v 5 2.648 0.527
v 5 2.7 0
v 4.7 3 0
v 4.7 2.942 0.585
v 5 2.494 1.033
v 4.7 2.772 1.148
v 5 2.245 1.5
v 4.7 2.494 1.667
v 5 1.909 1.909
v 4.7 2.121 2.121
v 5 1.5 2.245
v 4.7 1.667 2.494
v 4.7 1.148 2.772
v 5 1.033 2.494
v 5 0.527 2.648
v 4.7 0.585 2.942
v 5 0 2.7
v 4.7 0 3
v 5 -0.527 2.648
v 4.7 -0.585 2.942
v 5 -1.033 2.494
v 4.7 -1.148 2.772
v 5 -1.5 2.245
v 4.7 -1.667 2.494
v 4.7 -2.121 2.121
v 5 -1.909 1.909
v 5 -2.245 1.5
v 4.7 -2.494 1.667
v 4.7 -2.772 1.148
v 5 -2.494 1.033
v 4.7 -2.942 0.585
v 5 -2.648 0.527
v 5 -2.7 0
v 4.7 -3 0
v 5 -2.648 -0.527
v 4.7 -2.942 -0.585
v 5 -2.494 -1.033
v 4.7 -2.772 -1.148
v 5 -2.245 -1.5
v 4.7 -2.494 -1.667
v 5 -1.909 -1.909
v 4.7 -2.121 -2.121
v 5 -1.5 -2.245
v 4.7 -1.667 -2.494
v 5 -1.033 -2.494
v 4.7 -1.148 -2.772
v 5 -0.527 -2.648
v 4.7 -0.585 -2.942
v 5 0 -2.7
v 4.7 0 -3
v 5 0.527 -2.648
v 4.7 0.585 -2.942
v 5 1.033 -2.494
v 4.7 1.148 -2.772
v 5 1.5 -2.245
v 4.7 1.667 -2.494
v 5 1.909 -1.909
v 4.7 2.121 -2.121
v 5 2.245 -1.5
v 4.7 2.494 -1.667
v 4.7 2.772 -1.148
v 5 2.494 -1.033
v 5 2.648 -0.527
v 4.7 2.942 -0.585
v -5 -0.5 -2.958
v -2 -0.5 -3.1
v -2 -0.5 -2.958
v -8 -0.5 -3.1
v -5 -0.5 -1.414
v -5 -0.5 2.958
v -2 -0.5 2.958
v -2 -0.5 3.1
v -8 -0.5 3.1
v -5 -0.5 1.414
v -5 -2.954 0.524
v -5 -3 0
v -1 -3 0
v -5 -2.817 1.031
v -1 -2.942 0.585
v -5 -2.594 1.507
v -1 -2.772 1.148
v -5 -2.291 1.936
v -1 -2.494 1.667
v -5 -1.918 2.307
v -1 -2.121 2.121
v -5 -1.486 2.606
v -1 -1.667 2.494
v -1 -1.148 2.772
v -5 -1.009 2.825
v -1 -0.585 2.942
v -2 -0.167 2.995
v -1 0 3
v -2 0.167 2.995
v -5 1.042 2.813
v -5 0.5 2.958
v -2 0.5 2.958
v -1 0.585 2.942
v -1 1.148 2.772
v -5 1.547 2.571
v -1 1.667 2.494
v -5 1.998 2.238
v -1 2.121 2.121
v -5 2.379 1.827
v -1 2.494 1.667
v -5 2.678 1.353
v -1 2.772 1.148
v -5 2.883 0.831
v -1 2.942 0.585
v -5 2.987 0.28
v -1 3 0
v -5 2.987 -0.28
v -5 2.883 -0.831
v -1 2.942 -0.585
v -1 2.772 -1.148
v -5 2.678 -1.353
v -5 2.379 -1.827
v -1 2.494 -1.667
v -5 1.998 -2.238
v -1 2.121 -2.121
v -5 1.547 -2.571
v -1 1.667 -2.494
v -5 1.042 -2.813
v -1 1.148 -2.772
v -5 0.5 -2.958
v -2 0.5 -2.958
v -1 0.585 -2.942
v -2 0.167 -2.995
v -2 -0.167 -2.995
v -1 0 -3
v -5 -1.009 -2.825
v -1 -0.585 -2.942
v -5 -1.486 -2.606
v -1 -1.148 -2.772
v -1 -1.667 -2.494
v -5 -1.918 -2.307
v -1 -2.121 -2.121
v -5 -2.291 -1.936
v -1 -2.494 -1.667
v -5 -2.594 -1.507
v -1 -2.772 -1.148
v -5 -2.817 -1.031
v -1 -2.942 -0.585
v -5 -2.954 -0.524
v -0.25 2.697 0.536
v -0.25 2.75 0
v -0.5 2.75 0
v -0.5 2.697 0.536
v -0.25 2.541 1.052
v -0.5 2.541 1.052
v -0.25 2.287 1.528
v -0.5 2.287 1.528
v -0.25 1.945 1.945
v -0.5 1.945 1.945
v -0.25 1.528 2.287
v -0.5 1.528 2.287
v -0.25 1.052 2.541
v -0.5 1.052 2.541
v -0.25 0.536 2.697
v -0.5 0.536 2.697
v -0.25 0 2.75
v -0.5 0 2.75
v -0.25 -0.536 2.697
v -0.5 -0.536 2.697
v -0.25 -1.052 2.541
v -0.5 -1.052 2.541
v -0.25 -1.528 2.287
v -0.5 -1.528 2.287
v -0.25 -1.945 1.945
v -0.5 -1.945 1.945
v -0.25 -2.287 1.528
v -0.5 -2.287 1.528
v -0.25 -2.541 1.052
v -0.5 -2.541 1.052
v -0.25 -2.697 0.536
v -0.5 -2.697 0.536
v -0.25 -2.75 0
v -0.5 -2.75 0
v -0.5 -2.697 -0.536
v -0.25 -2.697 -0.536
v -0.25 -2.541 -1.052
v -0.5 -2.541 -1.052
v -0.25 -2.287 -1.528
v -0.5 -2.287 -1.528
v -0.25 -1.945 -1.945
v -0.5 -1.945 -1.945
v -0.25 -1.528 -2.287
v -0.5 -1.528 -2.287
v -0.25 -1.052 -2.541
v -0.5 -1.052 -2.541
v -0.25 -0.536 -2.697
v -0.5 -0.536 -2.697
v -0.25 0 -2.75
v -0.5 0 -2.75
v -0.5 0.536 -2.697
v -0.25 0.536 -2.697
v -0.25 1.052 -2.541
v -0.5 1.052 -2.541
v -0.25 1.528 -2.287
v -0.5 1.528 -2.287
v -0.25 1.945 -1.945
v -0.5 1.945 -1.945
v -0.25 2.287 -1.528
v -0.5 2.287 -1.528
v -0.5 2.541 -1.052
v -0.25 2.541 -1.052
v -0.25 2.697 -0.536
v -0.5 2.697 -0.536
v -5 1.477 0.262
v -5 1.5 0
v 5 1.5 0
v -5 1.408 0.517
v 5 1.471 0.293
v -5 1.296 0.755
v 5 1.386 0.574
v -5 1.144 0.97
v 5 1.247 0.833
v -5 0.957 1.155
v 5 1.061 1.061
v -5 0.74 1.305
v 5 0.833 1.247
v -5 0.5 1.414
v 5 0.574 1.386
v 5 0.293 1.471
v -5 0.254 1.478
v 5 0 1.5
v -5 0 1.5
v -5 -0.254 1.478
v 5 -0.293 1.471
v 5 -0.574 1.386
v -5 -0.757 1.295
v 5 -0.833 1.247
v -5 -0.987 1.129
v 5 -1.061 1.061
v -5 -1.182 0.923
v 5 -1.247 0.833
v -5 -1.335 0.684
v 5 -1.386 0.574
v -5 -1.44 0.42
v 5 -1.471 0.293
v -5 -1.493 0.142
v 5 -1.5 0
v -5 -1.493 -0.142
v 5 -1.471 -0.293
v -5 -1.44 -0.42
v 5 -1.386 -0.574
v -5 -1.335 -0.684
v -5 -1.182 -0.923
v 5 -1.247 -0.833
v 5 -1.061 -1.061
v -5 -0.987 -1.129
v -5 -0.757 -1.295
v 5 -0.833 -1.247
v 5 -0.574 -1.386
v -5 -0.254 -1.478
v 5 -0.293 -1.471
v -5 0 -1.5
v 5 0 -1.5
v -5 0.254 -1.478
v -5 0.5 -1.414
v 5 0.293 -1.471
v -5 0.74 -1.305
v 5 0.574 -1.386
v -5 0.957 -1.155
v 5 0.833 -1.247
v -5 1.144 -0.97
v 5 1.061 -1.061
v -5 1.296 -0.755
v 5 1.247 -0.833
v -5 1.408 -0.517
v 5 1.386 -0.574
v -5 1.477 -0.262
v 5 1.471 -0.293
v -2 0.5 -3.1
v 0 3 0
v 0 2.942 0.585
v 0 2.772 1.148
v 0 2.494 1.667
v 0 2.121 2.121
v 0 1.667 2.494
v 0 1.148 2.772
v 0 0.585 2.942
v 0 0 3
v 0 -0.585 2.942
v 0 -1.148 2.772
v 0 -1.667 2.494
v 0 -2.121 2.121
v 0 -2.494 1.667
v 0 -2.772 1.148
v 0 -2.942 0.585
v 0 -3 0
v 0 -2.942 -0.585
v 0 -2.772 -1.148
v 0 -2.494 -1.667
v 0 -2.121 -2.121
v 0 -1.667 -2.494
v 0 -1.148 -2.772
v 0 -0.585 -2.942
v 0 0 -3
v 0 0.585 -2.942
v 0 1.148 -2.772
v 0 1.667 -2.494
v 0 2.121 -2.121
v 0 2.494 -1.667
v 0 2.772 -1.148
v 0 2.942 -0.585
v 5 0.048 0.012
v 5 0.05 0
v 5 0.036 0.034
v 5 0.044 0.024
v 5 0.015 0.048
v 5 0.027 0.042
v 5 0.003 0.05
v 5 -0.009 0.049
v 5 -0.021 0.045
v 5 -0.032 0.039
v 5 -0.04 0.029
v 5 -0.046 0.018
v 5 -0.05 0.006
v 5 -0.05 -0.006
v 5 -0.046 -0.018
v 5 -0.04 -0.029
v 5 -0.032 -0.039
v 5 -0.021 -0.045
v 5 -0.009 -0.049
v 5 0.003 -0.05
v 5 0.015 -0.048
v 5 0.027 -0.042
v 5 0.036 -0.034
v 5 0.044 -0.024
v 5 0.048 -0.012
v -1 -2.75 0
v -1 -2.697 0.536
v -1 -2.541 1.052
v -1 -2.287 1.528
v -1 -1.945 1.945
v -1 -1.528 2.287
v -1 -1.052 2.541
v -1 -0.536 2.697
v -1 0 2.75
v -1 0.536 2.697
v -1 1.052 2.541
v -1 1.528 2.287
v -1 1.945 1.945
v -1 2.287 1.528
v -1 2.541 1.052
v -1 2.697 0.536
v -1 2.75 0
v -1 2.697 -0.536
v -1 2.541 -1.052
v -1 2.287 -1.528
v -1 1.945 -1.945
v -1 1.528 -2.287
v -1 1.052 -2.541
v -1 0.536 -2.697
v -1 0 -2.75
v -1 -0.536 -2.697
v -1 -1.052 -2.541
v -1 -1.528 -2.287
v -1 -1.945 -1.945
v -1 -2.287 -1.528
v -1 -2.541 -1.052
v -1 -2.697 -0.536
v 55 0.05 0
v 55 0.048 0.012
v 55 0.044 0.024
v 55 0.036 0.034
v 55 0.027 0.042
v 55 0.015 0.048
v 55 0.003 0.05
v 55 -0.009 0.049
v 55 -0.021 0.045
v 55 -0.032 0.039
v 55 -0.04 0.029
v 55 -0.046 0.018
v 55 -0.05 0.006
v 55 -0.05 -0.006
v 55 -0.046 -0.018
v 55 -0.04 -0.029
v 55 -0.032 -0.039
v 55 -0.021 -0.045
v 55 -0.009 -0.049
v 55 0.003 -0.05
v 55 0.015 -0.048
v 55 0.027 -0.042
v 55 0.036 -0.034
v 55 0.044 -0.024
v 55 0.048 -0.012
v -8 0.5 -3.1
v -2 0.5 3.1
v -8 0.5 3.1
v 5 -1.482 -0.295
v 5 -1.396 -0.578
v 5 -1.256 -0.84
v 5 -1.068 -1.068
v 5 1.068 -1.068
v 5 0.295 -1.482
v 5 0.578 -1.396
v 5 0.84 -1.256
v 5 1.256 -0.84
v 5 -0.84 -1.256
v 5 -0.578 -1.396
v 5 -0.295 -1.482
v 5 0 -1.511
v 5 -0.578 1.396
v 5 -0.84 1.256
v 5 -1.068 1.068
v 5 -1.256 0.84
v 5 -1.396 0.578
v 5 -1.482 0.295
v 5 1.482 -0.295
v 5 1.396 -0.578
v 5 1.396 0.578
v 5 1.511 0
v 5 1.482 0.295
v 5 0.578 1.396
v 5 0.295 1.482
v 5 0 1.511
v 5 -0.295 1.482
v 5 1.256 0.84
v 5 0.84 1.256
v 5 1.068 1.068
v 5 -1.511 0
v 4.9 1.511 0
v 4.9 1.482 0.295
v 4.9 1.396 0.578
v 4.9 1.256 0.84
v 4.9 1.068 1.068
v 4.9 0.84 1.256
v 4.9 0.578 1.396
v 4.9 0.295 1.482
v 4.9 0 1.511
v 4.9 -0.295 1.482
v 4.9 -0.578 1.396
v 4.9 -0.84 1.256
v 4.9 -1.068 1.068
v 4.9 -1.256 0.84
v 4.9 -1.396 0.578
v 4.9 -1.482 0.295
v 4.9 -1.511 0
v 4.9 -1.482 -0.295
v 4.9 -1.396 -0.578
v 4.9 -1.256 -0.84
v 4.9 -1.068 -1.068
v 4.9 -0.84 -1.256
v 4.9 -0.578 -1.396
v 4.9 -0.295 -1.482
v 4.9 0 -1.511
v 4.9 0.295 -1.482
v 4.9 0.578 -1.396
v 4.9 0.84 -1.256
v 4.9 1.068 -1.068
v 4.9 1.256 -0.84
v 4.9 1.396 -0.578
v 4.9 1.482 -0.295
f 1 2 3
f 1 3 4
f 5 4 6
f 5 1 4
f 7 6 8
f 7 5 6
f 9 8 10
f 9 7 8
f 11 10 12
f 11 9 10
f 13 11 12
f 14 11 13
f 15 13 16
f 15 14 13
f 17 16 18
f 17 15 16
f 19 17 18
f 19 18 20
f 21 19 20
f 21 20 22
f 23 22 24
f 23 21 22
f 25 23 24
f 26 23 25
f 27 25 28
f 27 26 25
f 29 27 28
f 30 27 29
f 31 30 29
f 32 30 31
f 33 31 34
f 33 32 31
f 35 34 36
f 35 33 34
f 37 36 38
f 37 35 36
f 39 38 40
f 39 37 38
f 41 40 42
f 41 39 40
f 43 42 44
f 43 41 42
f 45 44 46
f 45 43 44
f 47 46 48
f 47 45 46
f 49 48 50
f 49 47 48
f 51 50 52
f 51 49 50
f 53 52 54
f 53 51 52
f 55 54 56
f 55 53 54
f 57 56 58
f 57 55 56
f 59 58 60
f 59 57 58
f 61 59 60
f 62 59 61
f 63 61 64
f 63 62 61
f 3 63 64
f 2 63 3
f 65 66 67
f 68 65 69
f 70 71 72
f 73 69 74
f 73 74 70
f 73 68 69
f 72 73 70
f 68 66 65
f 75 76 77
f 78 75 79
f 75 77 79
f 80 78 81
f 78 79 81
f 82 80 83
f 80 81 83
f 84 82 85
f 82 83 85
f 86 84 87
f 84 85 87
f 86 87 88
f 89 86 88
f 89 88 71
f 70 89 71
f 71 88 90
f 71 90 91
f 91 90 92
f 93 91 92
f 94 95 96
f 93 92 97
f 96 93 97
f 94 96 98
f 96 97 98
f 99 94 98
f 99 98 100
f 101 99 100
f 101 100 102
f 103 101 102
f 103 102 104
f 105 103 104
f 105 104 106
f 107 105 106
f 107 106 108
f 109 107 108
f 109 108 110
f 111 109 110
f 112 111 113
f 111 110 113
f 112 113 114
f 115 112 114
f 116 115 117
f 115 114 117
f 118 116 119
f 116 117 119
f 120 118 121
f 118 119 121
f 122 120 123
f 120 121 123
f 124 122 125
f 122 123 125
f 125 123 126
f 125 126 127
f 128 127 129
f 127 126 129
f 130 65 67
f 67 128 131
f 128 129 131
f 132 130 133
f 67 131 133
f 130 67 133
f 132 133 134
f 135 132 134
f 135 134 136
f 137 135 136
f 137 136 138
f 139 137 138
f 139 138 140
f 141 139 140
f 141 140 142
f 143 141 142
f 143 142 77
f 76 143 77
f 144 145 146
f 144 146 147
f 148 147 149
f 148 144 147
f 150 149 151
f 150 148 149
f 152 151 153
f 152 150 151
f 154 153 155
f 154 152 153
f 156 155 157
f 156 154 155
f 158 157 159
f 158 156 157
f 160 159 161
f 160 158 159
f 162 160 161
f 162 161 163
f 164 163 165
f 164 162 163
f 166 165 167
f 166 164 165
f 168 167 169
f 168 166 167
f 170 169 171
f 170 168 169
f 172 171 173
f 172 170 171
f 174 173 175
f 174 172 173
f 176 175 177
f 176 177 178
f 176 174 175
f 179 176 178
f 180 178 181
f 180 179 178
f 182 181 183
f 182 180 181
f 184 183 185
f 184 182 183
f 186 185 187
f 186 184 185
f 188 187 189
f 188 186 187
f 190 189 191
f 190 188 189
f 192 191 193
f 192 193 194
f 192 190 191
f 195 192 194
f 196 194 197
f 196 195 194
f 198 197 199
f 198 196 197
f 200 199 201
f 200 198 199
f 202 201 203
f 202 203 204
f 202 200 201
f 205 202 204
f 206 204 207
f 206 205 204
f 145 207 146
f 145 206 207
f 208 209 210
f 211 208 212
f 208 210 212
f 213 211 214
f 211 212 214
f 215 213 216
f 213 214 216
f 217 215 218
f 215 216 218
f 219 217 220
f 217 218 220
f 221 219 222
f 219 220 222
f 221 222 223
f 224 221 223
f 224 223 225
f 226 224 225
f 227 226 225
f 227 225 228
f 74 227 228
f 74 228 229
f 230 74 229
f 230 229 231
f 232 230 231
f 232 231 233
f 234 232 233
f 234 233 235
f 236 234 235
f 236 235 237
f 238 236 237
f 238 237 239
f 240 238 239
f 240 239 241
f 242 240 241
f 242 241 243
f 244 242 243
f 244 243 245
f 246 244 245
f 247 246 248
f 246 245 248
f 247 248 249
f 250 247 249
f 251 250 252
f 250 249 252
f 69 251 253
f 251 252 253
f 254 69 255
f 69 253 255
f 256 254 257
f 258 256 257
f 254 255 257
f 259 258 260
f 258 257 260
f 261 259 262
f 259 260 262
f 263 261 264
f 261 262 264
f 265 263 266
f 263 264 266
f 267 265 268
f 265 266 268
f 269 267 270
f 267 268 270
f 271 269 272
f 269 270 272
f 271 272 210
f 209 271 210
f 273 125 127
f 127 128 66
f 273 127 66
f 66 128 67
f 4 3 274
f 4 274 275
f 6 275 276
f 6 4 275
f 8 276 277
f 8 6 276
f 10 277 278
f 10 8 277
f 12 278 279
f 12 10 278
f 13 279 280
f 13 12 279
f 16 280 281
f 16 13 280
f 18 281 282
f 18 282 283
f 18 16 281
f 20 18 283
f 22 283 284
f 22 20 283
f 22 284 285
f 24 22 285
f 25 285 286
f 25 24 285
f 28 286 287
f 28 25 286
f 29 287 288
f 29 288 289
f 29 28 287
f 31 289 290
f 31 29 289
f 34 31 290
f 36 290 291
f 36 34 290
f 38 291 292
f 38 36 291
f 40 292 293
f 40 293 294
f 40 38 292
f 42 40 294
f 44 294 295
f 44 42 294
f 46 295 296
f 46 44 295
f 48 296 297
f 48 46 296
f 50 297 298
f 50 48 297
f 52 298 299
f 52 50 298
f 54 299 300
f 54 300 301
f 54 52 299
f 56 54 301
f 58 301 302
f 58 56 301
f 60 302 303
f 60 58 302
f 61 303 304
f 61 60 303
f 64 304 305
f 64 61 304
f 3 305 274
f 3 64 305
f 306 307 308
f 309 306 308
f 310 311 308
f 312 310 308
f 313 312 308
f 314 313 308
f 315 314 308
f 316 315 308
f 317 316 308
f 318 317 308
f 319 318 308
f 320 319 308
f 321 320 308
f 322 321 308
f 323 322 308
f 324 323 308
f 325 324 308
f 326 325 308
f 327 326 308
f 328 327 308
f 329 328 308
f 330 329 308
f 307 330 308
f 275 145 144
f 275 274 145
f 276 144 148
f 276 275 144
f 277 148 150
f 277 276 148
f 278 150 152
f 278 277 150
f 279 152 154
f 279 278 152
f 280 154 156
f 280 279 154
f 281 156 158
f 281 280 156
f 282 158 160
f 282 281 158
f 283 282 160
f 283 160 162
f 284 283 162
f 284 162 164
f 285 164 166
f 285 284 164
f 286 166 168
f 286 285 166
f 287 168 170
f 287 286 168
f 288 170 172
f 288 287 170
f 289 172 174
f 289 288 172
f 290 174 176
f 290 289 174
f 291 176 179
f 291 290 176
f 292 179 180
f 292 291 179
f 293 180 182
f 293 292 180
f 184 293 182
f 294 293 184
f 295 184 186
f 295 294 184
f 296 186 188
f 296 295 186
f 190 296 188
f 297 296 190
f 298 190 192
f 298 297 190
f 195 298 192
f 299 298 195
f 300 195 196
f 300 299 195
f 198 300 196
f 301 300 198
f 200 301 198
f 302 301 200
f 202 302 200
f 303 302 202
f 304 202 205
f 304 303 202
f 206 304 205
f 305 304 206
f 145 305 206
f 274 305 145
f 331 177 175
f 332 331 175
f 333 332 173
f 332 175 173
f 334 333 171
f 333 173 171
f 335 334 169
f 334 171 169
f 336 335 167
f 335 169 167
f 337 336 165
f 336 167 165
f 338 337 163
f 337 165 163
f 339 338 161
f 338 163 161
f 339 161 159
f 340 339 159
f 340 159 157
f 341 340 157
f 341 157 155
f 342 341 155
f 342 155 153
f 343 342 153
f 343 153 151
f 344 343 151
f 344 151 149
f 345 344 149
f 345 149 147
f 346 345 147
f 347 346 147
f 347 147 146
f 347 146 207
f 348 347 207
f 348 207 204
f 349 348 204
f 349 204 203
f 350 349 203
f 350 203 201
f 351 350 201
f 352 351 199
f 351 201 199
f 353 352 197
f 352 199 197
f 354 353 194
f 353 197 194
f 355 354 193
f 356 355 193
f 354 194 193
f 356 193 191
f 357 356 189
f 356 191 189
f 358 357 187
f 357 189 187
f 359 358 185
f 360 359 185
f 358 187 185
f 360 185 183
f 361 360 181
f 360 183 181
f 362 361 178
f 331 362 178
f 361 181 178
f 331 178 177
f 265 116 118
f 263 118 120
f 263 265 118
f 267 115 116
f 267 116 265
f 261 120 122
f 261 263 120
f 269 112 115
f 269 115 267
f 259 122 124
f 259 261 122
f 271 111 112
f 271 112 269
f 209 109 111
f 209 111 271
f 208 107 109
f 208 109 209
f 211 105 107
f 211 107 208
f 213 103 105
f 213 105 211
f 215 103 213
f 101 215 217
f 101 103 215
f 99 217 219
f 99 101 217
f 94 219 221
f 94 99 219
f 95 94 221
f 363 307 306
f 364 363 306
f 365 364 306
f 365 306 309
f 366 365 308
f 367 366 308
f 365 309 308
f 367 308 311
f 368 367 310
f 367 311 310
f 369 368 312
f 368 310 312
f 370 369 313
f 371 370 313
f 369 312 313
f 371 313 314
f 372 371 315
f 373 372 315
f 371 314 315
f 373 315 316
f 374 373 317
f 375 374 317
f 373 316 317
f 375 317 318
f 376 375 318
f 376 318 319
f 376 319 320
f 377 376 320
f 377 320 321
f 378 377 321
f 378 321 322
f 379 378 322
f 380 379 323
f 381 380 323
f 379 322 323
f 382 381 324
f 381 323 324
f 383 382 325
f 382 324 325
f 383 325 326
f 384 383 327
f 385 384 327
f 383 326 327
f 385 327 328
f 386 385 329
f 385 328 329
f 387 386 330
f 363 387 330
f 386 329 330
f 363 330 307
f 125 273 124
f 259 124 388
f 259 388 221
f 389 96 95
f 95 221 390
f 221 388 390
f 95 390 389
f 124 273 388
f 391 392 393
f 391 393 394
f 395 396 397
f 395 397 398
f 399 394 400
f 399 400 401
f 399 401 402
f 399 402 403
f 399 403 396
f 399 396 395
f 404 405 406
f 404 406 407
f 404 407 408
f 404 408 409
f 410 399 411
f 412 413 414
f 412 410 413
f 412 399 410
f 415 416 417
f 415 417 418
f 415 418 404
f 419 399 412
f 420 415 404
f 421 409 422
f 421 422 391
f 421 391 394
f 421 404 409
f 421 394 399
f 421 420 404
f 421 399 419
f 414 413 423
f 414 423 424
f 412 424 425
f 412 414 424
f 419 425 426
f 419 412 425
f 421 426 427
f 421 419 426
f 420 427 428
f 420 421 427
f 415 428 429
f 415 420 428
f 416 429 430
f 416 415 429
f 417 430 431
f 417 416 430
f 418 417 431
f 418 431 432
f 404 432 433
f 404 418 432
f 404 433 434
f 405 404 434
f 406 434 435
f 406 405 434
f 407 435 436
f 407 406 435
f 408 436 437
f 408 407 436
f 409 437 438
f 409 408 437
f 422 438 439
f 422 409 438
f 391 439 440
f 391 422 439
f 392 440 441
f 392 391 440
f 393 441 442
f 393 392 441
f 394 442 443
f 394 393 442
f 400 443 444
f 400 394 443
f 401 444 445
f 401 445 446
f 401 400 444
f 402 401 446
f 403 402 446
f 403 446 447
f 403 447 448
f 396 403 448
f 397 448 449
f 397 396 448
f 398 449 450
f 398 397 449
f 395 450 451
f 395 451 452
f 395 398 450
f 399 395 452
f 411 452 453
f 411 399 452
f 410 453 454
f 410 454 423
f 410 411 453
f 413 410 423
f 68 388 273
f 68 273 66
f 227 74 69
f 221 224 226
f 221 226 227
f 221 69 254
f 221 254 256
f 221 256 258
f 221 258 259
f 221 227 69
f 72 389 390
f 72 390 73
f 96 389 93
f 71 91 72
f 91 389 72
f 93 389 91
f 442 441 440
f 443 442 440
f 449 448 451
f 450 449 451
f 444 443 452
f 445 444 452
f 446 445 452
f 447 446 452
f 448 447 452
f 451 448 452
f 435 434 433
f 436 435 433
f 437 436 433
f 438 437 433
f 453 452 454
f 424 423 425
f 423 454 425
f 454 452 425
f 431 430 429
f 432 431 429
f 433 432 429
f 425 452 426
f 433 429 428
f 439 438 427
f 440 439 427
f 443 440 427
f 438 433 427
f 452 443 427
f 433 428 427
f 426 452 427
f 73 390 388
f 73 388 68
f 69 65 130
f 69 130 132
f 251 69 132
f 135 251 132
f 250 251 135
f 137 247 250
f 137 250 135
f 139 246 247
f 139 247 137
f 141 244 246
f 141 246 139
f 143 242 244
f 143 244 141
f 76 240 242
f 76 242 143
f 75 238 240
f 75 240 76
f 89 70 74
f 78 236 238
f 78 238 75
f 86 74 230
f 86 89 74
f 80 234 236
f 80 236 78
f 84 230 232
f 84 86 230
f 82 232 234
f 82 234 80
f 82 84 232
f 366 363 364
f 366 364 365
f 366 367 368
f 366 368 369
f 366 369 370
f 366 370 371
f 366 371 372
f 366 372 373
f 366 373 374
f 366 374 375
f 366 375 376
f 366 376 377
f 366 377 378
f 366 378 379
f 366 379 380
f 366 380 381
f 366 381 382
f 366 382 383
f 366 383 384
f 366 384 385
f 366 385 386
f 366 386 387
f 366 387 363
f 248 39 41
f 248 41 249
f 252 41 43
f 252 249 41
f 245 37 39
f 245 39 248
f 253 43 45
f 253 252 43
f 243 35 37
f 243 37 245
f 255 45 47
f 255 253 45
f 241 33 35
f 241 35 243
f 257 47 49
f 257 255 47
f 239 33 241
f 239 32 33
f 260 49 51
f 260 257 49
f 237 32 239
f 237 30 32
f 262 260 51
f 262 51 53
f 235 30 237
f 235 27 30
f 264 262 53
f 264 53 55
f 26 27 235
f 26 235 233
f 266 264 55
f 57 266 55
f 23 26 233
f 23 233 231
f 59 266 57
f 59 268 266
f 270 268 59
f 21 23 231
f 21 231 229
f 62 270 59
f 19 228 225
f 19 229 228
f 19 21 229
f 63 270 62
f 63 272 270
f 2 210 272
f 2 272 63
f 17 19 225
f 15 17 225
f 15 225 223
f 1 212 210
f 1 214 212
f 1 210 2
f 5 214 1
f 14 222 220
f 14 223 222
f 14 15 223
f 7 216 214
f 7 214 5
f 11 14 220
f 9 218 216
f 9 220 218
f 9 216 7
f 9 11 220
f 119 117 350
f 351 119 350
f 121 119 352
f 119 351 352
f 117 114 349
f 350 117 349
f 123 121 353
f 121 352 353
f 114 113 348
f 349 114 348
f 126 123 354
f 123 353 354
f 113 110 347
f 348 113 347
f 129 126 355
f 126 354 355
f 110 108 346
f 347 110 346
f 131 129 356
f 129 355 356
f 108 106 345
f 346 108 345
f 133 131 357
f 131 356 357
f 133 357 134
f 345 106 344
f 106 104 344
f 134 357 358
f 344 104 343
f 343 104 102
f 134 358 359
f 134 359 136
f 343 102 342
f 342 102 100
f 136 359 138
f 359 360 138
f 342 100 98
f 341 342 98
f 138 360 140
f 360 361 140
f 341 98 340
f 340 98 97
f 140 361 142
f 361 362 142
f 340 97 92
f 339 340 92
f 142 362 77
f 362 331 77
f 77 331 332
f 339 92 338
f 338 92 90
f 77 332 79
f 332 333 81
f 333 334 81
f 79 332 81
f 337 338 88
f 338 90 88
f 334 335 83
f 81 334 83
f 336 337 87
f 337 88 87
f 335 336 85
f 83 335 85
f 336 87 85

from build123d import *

# Parameters (mm, degrees)
F0_R         = 3
F1_DEPTH     = 5
F2_R         = 2.75
F3_DEPTH     = 1
F4_R         = 3
F5_DEPTH     = 4
F6_W         = 1
F6_H         = 6.2
F7_DEPTH     = 3
F8_DEPTH     = 3
F9_DEPTH     = 0.5
F10_S5_R     = 2.75
F10_T6_DEPTH = 6
F11_SIZE     = 0.3
F12_R        = 1.5
F13_DEPTH    = 10
F14_R        = 0.05
F15_DEPTH    = 50
F16_R        = 1.5110821028
F17_DEPTH    = 0.1


# Not quite as in the source:
# - a fillet or chamfer that OpenCascade refuses, or shapes differently, is made with other operations: its cross-section is extruded or revolved along the edge and cut away or added


with BuildPart() as f1:
    # F0 (on Right) → F1 (new body)
    with BuildSketch(Plane.YZ):
        Circle(F0_R)
    extrude(amount=F1_DEPTH)

    # F2 (on face) → F3 (join)
    with BuildSketch(Plane(origin=(0, 0, 0), x_dir=(0, -1, 0), z_dir=(-1, 0, 0))):
        Circle(F2_R)
    extrude(amount=F3_DEPTH)

    # F4 (on face) → F5 (join)
    with BuildSketch(Plane(origin=(-1, 0, 0), x_dir=(0, -1, 0), z_dir=(-1, 0, 0))):
        Circle(F4_R)
    extrude(amount=F5_DEPTH)

    # F6 (on face) → F7 (join)
    with BuildSketch(Plane(origin=(-5, 0, 0), x_dir=(0, -1, 0), z_dir=(-1, 0, 0))):
        Rectangle(F6_W, F6_H)
    extrude(amount=F7_DEPTH)

    # F6 (on face) → F8 (join)
    with BuildSketch(Plane(origin=(-5, 0, 0), x_dir=(0, -1, 0), z_dir=(-1, 0, 0))):
        Rectangle(F6_W, F6_H)
    extrude(amount=-F8_DEPTH)

    # F0 (on Right) → F9 (join)
    with BuildSketch(Plane.YZ):
        Circle(F0_R)
    extrude(amount=-F9_DEPTH)

    # F10: chamfer of 0.5 on 1 edges, made by hand


with BuildPart() as f10_tool2:
    # F10_s3 → F10_t4 (revolve)
    with BuildSketch(Plane.XY):
        Polygon((-0.5, 2.5), (0, 3), (-0.5, 3), align=None)
    revolve(axis=Axis((-0.5, 0, 0), (1, 0, 0)))

    # F10_s5 → F10_t6 (cut, symmetric)
    with BuildSketch(Plane.YZ.offset(-0.2)):
        Circle(F10_S5_R)
    extrude(amount=F10_T6_DEPTH, both=True, mode=Mode.SUBTRACT)


with BuildPart() as f1_1:
    add(f1.part)

    # F10_t1: cut F10_tool2
    add(f10_tool2.part, mode=Mode.SUBTRACT)

    # F11
    f11_edges = [f1_1.edges().sort_by_distance(p)[0] for p in [
        (5, -3, 0),
    ]]
    chamfer(f11_edges, length=F11_SIZE)

    # F12 (on face) → F13 (cut)
    with BuildSketch(Plane.YZ.offset(5)):
        Circle(F12_R)
    extrude(amount=-F13_DEPTH, mode=Mode.SUBTRACT)


with BuildPart() as f15:
    # F14 (on face) → F15 (new body)
    with BuildSketch(Plane.YZ.offset(5)):
        Circle(F14_R)
    extrude(amount=F15_DEPTH)


with BuildPart() as f17:
    # F16 (on face) → F17 (new body)
    with BuildSketch(Plane.YZ.offset(5)):
        Circle(F16_R)
    extrude(amount=-F17_DEPTH)


solid = Compound([f1_1.part, f15.part, f17.part])
